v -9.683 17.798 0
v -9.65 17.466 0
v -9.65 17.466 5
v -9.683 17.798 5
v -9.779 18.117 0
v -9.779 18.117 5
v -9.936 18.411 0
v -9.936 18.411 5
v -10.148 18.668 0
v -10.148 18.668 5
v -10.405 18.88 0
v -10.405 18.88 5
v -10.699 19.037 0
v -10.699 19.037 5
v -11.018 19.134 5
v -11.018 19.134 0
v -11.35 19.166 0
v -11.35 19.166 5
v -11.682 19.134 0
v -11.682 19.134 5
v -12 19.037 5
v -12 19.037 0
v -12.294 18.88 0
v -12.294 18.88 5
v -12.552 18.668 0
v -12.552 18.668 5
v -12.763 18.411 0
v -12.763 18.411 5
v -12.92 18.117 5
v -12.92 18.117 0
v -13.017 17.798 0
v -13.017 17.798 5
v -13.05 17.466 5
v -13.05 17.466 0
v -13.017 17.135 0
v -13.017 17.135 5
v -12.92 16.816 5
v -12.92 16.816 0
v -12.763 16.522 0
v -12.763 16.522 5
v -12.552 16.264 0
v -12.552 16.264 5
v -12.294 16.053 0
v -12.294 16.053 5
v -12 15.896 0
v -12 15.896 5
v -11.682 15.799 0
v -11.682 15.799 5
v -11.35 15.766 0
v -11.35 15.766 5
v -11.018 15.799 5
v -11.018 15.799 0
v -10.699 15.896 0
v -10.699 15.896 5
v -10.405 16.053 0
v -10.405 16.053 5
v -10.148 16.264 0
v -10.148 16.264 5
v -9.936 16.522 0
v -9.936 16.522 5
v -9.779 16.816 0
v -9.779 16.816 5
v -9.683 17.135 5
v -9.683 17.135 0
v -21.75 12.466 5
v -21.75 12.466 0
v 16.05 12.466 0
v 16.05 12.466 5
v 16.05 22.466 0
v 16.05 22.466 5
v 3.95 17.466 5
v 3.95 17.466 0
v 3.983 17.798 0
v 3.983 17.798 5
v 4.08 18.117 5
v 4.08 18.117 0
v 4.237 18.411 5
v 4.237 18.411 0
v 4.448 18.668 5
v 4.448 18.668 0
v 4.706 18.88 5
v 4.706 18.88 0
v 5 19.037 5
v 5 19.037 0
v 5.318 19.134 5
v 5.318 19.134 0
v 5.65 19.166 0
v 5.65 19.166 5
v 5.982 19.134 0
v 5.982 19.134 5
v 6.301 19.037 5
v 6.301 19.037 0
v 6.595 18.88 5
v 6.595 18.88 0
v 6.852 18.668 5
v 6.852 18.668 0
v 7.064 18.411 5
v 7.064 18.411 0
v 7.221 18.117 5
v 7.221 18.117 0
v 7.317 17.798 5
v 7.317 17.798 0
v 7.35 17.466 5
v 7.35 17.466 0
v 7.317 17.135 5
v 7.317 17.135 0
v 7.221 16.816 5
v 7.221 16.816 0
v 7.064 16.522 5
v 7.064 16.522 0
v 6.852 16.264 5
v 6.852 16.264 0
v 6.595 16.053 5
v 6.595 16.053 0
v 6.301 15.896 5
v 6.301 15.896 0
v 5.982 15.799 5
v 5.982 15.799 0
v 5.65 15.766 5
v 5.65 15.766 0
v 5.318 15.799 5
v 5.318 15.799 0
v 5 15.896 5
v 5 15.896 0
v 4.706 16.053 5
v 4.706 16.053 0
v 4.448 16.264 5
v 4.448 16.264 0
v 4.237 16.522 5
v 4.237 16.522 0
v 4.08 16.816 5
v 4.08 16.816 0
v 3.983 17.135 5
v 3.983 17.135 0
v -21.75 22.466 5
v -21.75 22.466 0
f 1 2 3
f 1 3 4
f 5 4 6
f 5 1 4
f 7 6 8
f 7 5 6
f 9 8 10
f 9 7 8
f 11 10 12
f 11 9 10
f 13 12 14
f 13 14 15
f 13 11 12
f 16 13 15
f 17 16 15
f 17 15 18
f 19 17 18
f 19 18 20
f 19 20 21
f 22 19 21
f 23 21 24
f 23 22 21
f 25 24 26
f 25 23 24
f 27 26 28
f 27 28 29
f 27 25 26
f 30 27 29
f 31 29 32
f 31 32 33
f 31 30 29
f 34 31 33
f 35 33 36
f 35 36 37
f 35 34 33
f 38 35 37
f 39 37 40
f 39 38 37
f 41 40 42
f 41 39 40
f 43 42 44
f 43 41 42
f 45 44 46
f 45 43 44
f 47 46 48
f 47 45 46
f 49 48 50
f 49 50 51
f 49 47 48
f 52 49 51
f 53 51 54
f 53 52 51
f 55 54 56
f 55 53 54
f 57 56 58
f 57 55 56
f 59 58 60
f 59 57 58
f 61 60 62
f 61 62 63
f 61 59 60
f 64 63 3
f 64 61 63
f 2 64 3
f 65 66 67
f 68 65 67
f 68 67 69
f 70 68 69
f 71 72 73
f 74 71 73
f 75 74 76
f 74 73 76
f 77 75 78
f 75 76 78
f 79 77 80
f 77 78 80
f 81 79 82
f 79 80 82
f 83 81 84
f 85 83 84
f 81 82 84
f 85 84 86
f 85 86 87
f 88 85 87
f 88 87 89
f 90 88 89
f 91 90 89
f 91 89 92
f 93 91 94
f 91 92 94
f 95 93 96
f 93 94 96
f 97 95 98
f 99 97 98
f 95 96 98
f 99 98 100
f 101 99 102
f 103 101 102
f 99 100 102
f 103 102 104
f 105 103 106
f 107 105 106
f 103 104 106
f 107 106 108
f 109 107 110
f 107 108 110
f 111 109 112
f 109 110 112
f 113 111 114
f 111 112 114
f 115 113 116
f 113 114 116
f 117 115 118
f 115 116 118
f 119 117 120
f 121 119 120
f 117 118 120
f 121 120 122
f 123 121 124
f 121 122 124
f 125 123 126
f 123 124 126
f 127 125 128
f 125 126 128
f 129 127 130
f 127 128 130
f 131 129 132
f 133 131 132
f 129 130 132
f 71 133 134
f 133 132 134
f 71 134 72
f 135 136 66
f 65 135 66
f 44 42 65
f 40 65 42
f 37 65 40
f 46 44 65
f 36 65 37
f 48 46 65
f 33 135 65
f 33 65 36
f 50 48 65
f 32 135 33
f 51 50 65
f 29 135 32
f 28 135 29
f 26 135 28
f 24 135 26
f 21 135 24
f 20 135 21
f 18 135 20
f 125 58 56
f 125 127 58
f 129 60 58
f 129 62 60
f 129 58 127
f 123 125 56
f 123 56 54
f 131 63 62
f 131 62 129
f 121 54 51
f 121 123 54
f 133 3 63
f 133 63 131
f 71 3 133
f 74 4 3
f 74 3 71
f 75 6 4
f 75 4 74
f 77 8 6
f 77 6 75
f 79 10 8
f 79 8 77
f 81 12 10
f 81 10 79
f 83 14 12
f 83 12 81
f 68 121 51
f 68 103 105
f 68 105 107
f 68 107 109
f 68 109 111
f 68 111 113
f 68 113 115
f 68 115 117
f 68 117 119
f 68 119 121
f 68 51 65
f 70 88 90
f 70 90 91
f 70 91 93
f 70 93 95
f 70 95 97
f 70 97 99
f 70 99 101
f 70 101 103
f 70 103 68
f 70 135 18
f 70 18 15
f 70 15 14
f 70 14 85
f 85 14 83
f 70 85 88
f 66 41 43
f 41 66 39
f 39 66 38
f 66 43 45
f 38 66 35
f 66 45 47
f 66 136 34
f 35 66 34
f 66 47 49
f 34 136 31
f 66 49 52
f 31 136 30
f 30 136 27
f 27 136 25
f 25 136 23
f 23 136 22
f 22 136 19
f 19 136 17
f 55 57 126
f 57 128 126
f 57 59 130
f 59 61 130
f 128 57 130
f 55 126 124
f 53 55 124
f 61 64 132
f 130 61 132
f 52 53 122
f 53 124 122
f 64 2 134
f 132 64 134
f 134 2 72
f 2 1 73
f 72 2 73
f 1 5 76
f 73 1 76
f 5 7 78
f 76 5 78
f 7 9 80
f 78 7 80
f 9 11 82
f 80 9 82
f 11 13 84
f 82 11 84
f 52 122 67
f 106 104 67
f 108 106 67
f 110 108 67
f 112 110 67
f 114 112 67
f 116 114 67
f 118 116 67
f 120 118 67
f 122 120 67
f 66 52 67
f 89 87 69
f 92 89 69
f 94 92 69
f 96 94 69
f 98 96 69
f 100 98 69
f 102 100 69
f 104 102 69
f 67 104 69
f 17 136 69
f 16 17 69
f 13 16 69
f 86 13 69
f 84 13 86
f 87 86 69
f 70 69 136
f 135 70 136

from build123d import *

# Parameters (mm, degrees)
F0_R     = 1.7
F1_DEPTH = 5


with BuildPart() as f1:
    # F0 (on Top) → F1 (new body)
    with BuildSketch(Plane.XY):
        with Locations((-11.34986, 17.466265)):
            Circle(F0_R)
        Polygon((-2.84986, 22.466265), (-21.74986, 22.466265), (-21.74986, 12.466265), (-2.84986, 12.466265), (-2.84986, 17.466265), align=None)
        with Locations((-11.34986, 17.466265)):
            Circle(F0_R, mode=Mode.SUBTRACT)
        with BuildLine():
            ThreePointArc((7.35014, 17.466265), (5.65014, 19.166265), (3.95014, 17.466265))
            ThreePointArc((3.95014, 17.466265), (5.65014, 15.766265), (7.35014, 17.466265))
        make_face()
        Polygon((16.05014, 22.466265), (-2.84986, 22.466265), (-2.84986, 17.466265), (-2.84986, 12.466265), (16.05014, 12.466265), align=None)
        with BuildLine():
            ThreePointArc((7.35014, 17.466265), (5.65014, 15.766265), (3.95014, 17.466265))
            ThreePointArc((3.95014, 17.466265), (5.65014, 19.166265), (7.35014, 17.466265))
        make_face(mode=Mode.SUBTRACT)
    extrude(amount=F1_DEPTH)


solid = f1.part
